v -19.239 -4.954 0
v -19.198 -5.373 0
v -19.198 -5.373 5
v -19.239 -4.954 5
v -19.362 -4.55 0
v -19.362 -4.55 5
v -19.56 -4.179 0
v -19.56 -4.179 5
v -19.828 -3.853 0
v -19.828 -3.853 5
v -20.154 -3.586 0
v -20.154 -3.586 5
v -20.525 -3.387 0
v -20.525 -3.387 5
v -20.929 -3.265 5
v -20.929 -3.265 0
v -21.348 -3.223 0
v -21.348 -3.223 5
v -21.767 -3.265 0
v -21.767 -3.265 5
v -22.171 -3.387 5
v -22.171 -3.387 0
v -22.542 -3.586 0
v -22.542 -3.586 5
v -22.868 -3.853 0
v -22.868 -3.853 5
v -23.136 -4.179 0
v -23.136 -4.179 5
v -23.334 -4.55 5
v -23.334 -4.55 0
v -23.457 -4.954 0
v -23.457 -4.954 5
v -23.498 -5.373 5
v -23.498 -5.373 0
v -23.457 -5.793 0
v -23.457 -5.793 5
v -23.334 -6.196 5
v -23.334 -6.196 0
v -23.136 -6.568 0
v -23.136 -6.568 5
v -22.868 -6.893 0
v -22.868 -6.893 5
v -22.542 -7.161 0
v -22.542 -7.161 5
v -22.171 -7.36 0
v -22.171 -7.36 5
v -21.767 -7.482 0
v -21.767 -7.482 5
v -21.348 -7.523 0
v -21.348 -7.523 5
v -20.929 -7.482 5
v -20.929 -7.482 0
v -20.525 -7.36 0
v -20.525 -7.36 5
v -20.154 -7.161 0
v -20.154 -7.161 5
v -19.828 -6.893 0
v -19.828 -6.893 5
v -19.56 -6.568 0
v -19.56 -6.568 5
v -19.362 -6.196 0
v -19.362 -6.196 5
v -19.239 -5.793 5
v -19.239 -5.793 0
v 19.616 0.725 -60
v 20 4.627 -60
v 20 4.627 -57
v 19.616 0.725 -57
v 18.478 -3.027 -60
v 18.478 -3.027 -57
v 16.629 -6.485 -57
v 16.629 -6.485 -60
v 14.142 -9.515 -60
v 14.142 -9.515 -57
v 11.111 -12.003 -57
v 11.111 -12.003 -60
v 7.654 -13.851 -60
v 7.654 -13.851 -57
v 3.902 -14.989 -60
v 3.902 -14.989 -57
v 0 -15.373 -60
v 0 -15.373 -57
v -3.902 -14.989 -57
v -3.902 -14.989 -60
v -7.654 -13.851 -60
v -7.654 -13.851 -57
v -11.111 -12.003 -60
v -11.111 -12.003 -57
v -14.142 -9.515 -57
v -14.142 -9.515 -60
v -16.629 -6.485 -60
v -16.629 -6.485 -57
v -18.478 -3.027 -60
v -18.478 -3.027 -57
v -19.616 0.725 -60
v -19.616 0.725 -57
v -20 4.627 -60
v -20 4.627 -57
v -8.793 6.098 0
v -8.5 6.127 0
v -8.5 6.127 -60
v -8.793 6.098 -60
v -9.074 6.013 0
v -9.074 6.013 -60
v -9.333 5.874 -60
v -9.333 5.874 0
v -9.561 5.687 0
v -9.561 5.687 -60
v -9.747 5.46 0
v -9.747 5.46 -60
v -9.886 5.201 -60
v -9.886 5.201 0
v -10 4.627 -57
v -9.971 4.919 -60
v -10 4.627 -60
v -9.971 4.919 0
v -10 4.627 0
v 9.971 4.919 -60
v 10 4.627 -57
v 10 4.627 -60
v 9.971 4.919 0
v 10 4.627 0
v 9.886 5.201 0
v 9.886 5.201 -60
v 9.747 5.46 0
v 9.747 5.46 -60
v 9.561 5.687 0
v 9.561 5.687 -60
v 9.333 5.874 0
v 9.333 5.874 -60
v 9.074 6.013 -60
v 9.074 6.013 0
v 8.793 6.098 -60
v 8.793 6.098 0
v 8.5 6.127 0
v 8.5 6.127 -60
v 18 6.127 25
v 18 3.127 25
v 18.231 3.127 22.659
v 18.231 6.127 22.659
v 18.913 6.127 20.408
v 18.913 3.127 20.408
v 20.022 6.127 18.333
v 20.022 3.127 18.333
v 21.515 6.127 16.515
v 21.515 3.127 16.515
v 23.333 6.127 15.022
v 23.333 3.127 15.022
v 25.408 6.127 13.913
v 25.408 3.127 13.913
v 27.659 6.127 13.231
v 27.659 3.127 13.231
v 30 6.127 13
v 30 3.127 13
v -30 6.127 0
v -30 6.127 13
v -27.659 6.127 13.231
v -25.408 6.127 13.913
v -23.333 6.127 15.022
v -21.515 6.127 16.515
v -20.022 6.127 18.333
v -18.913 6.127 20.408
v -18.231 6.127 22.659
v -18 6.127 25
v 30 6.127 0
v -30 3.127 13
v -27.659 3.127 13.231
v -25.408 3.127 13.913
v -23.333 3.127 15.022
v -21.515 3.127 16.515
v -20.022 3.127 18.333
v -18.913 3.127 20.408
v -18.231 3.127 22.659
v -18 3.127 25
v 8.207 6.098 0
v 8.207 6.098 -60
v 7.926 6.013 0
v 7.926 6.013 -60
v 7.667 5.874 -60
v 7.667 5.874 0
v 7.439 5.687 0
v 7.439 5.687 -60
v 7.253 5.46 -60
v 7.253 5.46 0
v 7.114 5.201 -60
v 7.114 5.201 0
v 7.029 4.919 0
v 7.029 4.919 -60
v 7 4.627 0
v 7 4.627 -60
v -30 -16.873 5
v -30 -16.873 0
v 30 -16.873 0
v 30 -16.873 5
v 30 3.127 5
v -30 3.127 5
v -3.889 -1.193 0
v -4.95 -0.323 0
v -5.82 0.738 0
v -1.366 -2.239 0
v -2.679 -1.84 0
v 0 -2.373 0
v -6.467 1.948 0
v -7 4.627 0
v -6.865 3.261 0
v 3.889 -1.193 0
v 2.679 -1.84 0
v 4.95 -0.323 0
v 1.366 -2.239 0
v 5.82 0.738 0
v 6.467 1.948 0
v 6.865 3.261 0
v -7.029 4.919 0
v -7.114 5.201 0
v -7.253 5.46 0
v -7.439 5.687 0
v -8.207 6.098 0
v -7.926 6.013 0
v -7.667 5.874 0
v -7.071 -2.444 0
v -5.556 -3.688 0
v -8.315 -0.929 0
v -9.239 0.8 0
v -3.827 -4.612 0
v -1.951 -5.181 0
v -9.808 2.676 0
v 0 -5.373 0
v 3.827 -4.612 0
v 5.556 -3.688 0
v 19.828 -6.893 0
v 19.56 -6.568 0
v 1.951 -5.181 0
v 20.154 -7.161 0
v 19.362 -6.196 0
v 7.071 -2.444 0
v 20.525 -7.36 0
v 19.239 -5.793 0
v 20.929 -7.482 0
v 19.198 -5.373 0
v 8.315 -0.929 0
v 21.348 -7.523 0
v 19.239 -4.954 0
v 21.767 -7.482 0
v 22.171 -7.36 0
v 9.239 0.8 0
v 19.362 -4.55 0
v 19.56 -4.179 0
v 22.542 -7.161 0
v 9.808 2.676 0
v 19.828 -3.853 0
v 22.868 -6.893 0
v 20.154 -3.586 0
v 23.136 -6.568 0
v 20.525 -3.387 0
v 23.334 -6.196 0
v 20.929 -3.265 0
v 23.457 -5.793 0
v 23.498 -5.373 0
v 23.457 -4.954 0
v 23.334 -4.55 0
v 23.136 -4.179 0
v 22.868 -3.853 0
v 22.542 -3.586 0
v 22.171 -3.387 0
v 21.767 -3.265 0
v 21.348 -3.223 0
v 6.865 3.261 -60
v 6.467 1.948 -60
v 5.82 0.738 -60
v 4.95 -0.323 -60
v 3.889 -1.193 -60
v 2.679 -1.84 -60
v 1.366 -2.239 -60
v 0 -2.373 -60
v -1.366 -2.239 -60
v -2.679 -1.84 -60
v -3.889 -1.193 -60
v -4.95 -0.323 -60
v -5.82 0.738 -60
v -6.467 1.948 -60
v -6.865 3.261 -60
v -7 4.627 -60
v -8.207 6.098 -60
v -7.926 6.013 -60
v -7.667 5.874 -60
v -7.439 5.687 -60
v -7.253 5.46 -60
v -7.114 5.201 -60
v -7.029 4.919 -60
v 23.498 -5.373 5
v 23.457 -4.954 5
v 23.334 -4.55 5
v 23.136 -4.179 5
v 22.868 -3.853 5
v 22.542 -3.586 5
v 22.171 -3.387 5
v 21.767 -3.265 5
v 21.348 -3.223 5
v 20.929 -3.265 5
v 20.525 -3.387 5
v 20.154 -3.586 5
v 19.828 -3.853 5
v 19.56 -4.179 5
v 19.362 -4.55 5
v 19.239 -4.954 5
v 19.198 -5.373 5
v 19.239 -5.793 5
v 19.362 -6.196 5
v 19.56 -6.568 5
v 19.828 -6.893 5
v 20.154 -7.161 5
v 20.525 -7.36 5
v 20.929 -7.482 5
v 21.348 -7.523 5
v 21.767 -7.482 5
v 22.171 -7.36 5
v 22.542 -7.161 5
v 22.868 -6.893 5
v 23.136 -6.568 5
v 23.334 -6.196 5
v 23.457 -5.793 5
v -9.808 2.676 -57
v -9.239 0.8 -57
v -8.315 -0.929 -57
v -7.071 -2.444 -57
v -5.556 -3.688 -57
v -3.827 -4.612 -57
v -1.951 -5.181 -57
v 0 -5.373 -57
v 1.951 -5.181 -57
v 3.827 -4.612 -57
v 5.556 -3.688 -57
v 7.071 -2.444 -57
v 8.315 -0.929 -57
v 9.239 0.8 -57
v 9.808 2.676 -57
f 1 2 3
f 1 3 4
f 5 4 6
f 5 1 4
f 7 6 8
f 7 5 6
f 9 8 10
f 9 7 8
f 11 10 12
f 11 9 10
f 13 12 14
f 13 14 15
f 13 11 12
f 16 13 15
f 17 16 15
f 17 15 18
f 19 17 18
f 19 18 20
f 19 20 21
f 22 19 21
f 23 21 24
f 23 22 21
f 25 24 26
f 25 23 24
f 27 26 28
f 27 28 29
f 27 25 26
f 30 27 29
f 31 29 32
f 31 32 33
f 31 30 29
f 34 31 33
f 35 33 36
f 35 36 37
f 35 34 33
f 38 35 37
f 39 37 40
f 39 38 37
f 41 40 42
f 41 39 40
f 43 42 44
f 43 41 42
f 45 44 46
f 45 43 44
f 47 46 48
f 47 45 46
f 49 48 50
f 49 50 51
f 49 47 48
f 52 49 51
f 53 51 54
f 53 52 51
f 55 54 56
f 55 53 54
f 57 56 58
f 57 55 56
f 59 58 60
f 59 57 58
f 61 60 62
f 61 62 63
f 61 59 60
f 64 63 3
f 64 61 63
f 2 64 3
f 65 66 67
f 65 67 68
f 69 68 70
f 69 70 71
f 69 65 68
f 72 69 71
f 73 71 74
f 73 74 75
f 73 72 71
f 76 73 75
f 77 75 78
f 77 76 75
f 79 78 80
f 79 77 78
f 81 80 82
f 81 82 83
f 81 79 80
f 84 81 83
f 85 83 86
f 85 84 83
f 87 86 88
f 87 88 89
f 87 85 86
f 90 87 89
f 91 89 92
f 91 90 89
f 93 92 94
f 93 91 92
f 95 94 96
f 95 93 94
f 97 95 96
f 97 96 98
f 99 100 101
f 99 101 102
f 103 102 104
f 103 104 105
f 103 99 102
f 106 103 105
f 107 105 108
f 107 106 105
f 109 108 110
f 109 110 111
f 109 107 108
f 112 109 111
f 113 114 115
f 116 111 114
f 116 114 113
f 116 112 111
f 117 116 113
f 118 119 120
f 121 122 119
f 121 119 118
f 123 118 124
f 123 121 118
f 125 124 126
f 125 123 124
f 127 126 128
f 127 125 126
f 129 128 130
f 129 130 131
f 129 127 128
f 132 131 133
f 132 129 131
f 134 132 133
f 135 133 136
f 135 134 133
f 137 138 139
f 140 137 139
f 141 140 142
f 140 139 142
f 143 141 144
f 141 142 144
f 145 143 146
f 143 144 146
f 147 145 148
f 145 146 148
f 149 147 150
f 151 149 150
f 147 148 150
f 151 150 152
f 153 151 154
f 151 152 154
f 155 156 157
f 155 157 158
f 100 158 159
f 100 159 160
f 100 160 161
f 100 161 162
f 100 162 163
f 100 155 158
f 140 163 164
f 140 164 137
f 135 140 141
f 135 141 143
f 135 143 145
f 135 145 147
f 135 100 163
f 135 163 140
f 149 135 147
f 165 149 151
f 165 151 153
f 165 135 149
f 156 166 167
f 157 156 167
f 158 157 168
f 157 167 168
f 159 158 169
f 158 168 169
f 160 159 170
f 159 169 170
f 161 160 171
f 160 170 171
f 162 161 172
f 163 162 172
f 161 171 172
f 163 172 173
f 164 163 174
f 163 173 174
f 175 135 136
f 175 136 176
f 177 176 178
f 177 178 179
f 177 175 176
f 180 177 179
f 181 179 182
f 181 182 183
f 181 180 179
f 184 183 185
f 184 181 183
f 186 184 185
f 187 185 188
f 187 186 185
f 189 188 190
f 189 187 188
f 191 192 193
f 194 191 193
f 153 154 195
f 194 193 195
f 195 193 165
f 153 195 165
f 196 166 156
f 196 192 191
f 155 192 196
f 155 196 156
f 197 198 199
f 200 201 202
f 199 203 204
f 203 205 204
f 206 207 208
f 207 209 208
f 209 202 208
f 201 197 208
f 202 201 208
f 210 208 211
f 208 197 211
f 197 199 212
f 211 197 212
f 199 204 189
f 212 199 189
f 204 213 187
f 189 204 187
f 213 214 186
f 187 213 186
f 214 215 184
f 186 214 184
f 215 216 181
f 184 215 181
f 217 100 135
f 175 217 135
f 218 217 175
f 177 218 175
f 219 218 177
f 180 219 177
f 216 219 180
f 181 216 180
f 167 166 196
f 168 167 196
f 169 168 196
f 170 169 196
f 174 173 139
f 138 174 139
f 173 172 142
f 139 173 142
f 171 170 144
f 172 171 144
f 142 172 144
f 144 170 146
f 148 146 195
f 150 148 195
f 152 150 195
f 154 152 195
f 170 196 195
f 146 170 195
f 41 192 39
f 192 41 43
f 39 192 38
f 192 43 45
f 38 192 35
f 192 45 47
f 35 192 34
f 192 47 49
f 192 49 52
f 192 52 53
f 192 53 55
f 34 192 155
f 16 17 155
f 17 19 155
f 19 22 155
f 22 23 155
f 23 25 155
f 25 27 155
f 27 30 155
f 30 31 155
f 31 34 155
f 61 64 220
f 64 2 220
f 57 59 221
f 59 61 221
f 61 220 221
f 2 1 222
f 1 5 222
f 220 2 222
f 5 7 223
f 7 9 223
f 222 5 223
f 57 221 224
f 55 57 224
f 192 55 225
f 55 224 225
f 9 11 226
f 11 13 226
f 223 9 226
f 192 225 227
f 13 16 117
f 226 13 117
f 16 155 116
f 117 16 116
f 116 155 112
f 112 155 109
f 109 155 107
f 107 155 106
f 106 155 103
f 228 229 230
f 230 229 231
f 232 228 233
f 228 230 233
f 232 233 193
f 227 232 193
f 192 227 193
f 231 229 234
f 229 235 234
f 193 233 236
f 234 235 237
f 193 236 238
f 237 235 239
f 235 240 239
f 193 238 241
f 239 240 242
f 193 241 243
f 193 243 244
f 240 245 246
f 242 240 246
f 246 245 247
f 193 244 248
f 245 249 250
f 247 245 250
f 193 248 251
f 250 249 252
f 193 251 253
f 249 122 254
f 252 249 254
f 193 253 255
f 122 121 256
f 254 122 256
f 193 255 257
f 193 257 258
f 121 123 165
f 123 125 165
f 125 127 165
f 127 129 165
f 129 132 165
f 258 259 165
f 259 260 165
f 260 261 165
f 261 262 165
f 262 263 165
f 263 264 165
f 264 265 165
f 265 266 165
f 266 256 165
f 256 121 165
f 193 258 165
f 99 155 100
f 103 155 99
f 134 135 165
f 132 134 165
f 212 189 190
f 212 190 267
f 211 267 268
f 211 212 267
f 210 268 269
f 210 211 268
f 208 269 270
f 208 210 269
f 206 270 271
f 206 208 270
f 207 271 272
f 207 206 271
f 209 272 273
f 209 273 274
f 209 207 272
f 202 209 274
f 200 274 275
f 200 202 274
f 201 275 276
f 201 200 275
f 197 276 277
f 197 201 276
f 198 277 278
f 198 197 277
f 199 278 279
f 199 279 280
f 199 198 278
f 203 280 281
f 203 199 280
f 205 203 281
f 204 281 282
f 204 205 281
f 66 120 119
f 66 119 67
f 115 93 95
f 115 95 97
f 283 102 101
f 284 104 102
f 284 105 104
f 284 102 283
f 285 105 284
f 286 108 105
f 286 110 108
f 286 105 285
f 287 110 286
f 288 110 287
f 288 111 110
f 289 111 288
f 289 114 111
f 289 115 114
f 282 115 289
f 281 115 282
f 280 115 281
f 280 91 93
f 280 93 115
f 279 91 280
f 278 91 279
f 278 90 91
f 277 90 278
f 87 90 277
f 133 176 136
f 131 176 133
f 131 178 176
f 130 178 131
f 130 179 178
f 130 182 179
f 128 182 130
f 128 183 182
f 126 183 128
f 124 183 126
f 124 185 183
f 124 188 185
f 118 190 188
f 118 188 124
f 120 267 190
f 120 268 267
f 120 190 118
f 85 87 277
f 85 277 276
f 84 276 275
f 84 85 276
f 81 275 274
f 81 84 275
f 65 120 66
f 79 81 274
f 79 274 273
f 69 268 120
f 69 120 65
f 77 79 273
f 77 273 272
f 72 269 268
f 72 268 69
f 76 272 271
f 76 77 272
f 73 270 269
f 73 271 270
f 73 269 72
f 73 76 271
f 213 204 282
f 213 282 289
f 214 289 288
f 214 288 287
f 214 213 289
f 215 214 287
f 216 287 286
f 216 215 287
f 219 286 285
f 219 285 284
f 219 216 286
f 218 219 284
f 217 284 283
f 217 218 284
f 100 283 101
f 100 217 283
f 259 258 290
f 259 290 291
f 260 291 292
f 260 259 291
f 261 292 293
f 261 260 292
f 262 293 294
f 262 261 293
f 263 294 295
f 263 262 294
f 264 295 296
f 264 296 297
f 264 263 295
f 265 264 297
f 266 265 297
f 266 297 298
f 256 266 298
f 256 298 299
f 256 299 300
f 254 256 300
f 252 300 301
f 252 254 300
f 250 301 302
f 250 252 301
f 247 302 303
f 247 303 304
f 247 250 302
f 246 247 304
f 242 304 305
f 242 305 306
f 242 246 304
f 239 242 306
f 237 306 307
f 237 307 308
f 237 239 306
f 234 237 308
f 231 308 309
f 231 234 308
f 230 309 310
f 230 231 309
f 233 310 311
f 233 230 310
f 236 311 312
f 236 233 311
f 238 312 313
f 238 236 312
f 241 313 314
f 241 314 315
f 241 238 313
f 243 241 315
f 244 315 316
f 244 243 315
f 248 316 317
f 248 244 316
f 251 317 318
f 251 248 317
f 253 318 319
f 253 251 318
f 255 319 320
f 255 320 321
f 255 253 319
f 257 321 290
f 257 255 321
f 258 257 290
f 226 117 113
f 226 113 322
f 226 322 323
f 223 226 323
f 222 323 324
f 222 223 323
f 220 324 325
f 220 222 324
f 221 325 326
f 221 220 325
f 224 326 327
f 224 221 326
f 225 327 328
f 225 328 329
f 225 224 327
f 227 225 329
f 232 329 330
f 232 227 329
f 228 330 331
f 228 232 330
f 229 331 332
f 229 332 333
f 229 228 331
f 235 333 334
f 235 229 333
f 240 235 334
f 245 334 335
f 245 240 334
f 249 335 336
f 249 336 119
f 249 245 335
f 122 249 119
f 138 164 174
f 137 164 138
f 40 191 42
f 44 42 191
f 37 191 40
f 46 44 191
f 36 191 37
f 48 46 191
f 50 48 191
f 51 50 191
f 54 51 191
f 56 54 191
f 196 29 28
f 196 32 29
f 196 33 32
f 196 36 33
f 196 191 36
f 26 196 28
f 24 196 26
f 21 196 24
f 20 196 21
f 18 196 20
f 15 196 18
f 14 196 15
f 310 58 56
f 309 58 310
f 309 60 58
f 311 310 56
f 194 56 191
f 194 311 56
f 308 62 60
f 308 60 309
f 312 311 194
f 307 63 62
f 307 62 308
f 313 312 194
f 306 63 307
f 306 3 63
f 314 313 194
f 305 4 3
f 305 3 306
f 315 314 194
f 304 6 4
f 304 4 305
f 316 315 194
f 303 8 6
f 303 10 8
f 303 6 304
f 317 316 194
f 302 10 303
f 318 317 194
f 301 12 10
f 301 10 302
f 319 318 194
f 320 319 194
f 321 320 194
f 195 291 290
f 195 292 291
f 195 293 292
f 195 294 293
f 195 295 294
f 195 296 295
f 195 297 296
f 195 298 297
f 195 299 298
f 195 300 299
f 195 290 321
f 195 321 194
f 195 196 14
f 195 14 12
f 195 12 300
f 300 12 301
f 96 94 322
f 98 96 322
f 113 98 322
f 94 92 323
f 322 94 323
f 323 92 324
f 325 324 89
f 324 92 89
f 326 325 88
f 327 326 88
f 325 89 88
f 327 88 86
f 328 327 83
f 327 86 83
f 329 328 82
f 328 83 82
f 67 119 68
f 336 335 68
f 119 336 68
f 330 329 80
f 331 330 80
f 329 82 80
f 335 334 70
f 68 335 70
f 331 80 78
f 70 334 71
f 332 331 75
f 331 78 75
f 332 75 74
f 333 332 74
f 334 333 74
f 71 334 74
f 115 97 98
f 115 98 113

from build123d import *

# Parameters (mm, degrees)
F0_R     = 2.15
F1_DEPTH = 5
F2_W     = 60
F2_H     = 3
F3_DEPTH = 20
F5_DEPTH = 4
F6_DEPTH = 60
F8_DEPTH = 3


# Not quite as in the source:
# - a feature names something its author has since deleted; it is built from what else it names


with BuildPart() as f1:
    # F0 (on Top) → F1 (new body)
    with BuildSketch(Plane.XY):
        with BuildLine():
            ThreePointArc((-10, 4.6267989092), (-9.5606601718, 5.6874590809), (-8.5, 6.1267989092))
            Line((-8.5, 6.1267989092), (-30, 6.1267989092))
            Line((-30, 6.1267989092), (-30, -16.8732010908))
            Line((-30, -16.8732010908), (30, -16.8732010908))
            Line((30, -16.8732010908), (30, 6.1267989092))
            Line((30, 6.1267989092), (8.4999999793, 6.1267989092))
            ThreePointArc((8.4999999793, 6.1267989092), (9.5606601645, 5.6874590882), (10, 4.6267989092))
            ThreePointArc((10, 4.6267989092), (0, -5.3732010908), (-10, 4.6267989092))
        make_face()
        with Locations((-21.3480107486, -5.3732010908)):
            Circle(F0_R, mode=Mode.SUBTRACT)
        with Locations((21.3480107486, -5.3732010908)):
            Circle(F0_R, mode=Mode.SUBTRACT)
        with BuildLine():
            ThreePointArc((-7, 4.6267989092), (-7.4393398282, 5.6874590809), (-8.5, 6.1267989092))
            ThreePointArc((-8.5, 6.1267989092), (-9.5606601718, 5.6874590809), (-10, 4.6267989092))
            ThreePointArc((-10, 4.6267989092), (0, -5.3732010908), (10, 4.6267989092))
            ThreePointArc((10, 4.6267989092), (9.5606601645, 5.6874590882), (8.4999999793, 6.1267989092))
            ThreePointArc((8.4999999793, 6.1267989092), (7.4393398209, 5.6874590736), (7, 4.6267989092))
            ThreePointArc((7, 4.6267989092), (0, -2.3732010908), (-7, 4.6267989092))
        make_face()
        with BuildLine():
            Line((8, 6.1267989092), (-8, 6.1267989092))
            Line((-8, 6.1267989092), (-8.5, 6.1267989092))
            ThreePointArc((-8.5, 6.1267989092), (-7.4393398282, 5.6874590809), (-7, 4.6267989092))
            ThreePointArc((-7, 4.6267989092), (0, -2.3732010908), (7, 4.6267989092))
            ThreePointArc((7, 4.6267989092), (7.4393398209, 5.6874590736), (8.4999999793, 6.1267989092))
            Line((8.4999999793, 6.1267989092), (8, 6.1267989092))
        make_face()
    extrude(amount=F1_DEPTH)

    # F2 (on face) → F3 (join)
    with BuildSketch(Plane.XY.offset(5)):
        with Locations((0, 4.6267989092)):
            Rectangle(F2_W, F2_H)
    extrude(amount=F3_DEPTH)

    # F4 (on face) → F5 (cut)
    with BuildSketch(Plane.XZ.offset(-3.1267989092)):
        with BuildLine():
            Line((-30, 25), (-30, 13))
            ThreePointArc((-30, 13), (-21.5147186258, 16.5147186258), (-18, 25))
            Line((-18, 25), (-30, 25))
        make_face()
        with BuildLine():
            Line((30, 25), (18, 25))
            ThreePointArc((18, 25), (21.5147186258, 16.5147186258), (30, 13))
            Line((30, 13), (30, 25))
        make_face()
    extrude(amount=-F5_DEPTH, mode=Mode.SUBTRACT)

    # F0 (on Top) → F6 (join)
    with BuildSketch(Plane.XY):
        with BuildLine():
            ThreePointArc((-7, 4.6267989092), (-7.4393398282, 5.6874590809), (-8.5, 6.1267989092))
            ThreePointArc((-8.5, 6.1267989092), (-9.5606601718, 5.6874590809), (-10, 4.6267989092))
            ThreePointArc((-10, 4.6267989092), (0, -5.3732010908), (10, 4.6267989092))
            ThreePointArc((10, 4.6267989092), (9.5606601645, 5.6874590882), (8.4999999793, 6.1267989092))
            ThreePointArc((8.4999999793, 6.1267989092), (7.4393398209, 5.6874590736), (7, 4.6267989092))
            ThreePointArc((7, 4.6267989092), (0, -2.3732010908), (-7, 4.6267989092))
        make_face()
    extrude(amount=-F6_DEPTH)

    # F7 (on face) → F8 (join)
    with BuildSketch(Plane(origin=(0, 0, -60), x_dir=(1, 0, 0), z_dir=(0, 0, -1))):
        with BuildLine():
            ThreePointArc((20, -4.6267989092), (0, 15.3732010908), (-20, -4.6267989092))
            Line((-20, -4.6267989092), (-10, -4.6267989092))
            ThreePointArc((-10, -4.6267989092), (0, 5.3732010908), (10, -4.6267989092))
            Line((10, -4.6267989092), (20, -4.6267989092))
        make_face()
        with BuildLine():
            ThreePointArc((10, -4.6267989092), (0, 5.3732010908), (-10, -4.6267989092))
            Line((-10, -4.6267989092), (-7, -4.6267989092))
            ThreePointArc((-7, -4.6267989092), (0, 2.3732010908), (7, -4.6267989092))
            Line((7, -4.6267989092), (10, -4.6267989092))
        make_face()
    extrude(amount=-F8_DEPTH)


solid = f1.part
